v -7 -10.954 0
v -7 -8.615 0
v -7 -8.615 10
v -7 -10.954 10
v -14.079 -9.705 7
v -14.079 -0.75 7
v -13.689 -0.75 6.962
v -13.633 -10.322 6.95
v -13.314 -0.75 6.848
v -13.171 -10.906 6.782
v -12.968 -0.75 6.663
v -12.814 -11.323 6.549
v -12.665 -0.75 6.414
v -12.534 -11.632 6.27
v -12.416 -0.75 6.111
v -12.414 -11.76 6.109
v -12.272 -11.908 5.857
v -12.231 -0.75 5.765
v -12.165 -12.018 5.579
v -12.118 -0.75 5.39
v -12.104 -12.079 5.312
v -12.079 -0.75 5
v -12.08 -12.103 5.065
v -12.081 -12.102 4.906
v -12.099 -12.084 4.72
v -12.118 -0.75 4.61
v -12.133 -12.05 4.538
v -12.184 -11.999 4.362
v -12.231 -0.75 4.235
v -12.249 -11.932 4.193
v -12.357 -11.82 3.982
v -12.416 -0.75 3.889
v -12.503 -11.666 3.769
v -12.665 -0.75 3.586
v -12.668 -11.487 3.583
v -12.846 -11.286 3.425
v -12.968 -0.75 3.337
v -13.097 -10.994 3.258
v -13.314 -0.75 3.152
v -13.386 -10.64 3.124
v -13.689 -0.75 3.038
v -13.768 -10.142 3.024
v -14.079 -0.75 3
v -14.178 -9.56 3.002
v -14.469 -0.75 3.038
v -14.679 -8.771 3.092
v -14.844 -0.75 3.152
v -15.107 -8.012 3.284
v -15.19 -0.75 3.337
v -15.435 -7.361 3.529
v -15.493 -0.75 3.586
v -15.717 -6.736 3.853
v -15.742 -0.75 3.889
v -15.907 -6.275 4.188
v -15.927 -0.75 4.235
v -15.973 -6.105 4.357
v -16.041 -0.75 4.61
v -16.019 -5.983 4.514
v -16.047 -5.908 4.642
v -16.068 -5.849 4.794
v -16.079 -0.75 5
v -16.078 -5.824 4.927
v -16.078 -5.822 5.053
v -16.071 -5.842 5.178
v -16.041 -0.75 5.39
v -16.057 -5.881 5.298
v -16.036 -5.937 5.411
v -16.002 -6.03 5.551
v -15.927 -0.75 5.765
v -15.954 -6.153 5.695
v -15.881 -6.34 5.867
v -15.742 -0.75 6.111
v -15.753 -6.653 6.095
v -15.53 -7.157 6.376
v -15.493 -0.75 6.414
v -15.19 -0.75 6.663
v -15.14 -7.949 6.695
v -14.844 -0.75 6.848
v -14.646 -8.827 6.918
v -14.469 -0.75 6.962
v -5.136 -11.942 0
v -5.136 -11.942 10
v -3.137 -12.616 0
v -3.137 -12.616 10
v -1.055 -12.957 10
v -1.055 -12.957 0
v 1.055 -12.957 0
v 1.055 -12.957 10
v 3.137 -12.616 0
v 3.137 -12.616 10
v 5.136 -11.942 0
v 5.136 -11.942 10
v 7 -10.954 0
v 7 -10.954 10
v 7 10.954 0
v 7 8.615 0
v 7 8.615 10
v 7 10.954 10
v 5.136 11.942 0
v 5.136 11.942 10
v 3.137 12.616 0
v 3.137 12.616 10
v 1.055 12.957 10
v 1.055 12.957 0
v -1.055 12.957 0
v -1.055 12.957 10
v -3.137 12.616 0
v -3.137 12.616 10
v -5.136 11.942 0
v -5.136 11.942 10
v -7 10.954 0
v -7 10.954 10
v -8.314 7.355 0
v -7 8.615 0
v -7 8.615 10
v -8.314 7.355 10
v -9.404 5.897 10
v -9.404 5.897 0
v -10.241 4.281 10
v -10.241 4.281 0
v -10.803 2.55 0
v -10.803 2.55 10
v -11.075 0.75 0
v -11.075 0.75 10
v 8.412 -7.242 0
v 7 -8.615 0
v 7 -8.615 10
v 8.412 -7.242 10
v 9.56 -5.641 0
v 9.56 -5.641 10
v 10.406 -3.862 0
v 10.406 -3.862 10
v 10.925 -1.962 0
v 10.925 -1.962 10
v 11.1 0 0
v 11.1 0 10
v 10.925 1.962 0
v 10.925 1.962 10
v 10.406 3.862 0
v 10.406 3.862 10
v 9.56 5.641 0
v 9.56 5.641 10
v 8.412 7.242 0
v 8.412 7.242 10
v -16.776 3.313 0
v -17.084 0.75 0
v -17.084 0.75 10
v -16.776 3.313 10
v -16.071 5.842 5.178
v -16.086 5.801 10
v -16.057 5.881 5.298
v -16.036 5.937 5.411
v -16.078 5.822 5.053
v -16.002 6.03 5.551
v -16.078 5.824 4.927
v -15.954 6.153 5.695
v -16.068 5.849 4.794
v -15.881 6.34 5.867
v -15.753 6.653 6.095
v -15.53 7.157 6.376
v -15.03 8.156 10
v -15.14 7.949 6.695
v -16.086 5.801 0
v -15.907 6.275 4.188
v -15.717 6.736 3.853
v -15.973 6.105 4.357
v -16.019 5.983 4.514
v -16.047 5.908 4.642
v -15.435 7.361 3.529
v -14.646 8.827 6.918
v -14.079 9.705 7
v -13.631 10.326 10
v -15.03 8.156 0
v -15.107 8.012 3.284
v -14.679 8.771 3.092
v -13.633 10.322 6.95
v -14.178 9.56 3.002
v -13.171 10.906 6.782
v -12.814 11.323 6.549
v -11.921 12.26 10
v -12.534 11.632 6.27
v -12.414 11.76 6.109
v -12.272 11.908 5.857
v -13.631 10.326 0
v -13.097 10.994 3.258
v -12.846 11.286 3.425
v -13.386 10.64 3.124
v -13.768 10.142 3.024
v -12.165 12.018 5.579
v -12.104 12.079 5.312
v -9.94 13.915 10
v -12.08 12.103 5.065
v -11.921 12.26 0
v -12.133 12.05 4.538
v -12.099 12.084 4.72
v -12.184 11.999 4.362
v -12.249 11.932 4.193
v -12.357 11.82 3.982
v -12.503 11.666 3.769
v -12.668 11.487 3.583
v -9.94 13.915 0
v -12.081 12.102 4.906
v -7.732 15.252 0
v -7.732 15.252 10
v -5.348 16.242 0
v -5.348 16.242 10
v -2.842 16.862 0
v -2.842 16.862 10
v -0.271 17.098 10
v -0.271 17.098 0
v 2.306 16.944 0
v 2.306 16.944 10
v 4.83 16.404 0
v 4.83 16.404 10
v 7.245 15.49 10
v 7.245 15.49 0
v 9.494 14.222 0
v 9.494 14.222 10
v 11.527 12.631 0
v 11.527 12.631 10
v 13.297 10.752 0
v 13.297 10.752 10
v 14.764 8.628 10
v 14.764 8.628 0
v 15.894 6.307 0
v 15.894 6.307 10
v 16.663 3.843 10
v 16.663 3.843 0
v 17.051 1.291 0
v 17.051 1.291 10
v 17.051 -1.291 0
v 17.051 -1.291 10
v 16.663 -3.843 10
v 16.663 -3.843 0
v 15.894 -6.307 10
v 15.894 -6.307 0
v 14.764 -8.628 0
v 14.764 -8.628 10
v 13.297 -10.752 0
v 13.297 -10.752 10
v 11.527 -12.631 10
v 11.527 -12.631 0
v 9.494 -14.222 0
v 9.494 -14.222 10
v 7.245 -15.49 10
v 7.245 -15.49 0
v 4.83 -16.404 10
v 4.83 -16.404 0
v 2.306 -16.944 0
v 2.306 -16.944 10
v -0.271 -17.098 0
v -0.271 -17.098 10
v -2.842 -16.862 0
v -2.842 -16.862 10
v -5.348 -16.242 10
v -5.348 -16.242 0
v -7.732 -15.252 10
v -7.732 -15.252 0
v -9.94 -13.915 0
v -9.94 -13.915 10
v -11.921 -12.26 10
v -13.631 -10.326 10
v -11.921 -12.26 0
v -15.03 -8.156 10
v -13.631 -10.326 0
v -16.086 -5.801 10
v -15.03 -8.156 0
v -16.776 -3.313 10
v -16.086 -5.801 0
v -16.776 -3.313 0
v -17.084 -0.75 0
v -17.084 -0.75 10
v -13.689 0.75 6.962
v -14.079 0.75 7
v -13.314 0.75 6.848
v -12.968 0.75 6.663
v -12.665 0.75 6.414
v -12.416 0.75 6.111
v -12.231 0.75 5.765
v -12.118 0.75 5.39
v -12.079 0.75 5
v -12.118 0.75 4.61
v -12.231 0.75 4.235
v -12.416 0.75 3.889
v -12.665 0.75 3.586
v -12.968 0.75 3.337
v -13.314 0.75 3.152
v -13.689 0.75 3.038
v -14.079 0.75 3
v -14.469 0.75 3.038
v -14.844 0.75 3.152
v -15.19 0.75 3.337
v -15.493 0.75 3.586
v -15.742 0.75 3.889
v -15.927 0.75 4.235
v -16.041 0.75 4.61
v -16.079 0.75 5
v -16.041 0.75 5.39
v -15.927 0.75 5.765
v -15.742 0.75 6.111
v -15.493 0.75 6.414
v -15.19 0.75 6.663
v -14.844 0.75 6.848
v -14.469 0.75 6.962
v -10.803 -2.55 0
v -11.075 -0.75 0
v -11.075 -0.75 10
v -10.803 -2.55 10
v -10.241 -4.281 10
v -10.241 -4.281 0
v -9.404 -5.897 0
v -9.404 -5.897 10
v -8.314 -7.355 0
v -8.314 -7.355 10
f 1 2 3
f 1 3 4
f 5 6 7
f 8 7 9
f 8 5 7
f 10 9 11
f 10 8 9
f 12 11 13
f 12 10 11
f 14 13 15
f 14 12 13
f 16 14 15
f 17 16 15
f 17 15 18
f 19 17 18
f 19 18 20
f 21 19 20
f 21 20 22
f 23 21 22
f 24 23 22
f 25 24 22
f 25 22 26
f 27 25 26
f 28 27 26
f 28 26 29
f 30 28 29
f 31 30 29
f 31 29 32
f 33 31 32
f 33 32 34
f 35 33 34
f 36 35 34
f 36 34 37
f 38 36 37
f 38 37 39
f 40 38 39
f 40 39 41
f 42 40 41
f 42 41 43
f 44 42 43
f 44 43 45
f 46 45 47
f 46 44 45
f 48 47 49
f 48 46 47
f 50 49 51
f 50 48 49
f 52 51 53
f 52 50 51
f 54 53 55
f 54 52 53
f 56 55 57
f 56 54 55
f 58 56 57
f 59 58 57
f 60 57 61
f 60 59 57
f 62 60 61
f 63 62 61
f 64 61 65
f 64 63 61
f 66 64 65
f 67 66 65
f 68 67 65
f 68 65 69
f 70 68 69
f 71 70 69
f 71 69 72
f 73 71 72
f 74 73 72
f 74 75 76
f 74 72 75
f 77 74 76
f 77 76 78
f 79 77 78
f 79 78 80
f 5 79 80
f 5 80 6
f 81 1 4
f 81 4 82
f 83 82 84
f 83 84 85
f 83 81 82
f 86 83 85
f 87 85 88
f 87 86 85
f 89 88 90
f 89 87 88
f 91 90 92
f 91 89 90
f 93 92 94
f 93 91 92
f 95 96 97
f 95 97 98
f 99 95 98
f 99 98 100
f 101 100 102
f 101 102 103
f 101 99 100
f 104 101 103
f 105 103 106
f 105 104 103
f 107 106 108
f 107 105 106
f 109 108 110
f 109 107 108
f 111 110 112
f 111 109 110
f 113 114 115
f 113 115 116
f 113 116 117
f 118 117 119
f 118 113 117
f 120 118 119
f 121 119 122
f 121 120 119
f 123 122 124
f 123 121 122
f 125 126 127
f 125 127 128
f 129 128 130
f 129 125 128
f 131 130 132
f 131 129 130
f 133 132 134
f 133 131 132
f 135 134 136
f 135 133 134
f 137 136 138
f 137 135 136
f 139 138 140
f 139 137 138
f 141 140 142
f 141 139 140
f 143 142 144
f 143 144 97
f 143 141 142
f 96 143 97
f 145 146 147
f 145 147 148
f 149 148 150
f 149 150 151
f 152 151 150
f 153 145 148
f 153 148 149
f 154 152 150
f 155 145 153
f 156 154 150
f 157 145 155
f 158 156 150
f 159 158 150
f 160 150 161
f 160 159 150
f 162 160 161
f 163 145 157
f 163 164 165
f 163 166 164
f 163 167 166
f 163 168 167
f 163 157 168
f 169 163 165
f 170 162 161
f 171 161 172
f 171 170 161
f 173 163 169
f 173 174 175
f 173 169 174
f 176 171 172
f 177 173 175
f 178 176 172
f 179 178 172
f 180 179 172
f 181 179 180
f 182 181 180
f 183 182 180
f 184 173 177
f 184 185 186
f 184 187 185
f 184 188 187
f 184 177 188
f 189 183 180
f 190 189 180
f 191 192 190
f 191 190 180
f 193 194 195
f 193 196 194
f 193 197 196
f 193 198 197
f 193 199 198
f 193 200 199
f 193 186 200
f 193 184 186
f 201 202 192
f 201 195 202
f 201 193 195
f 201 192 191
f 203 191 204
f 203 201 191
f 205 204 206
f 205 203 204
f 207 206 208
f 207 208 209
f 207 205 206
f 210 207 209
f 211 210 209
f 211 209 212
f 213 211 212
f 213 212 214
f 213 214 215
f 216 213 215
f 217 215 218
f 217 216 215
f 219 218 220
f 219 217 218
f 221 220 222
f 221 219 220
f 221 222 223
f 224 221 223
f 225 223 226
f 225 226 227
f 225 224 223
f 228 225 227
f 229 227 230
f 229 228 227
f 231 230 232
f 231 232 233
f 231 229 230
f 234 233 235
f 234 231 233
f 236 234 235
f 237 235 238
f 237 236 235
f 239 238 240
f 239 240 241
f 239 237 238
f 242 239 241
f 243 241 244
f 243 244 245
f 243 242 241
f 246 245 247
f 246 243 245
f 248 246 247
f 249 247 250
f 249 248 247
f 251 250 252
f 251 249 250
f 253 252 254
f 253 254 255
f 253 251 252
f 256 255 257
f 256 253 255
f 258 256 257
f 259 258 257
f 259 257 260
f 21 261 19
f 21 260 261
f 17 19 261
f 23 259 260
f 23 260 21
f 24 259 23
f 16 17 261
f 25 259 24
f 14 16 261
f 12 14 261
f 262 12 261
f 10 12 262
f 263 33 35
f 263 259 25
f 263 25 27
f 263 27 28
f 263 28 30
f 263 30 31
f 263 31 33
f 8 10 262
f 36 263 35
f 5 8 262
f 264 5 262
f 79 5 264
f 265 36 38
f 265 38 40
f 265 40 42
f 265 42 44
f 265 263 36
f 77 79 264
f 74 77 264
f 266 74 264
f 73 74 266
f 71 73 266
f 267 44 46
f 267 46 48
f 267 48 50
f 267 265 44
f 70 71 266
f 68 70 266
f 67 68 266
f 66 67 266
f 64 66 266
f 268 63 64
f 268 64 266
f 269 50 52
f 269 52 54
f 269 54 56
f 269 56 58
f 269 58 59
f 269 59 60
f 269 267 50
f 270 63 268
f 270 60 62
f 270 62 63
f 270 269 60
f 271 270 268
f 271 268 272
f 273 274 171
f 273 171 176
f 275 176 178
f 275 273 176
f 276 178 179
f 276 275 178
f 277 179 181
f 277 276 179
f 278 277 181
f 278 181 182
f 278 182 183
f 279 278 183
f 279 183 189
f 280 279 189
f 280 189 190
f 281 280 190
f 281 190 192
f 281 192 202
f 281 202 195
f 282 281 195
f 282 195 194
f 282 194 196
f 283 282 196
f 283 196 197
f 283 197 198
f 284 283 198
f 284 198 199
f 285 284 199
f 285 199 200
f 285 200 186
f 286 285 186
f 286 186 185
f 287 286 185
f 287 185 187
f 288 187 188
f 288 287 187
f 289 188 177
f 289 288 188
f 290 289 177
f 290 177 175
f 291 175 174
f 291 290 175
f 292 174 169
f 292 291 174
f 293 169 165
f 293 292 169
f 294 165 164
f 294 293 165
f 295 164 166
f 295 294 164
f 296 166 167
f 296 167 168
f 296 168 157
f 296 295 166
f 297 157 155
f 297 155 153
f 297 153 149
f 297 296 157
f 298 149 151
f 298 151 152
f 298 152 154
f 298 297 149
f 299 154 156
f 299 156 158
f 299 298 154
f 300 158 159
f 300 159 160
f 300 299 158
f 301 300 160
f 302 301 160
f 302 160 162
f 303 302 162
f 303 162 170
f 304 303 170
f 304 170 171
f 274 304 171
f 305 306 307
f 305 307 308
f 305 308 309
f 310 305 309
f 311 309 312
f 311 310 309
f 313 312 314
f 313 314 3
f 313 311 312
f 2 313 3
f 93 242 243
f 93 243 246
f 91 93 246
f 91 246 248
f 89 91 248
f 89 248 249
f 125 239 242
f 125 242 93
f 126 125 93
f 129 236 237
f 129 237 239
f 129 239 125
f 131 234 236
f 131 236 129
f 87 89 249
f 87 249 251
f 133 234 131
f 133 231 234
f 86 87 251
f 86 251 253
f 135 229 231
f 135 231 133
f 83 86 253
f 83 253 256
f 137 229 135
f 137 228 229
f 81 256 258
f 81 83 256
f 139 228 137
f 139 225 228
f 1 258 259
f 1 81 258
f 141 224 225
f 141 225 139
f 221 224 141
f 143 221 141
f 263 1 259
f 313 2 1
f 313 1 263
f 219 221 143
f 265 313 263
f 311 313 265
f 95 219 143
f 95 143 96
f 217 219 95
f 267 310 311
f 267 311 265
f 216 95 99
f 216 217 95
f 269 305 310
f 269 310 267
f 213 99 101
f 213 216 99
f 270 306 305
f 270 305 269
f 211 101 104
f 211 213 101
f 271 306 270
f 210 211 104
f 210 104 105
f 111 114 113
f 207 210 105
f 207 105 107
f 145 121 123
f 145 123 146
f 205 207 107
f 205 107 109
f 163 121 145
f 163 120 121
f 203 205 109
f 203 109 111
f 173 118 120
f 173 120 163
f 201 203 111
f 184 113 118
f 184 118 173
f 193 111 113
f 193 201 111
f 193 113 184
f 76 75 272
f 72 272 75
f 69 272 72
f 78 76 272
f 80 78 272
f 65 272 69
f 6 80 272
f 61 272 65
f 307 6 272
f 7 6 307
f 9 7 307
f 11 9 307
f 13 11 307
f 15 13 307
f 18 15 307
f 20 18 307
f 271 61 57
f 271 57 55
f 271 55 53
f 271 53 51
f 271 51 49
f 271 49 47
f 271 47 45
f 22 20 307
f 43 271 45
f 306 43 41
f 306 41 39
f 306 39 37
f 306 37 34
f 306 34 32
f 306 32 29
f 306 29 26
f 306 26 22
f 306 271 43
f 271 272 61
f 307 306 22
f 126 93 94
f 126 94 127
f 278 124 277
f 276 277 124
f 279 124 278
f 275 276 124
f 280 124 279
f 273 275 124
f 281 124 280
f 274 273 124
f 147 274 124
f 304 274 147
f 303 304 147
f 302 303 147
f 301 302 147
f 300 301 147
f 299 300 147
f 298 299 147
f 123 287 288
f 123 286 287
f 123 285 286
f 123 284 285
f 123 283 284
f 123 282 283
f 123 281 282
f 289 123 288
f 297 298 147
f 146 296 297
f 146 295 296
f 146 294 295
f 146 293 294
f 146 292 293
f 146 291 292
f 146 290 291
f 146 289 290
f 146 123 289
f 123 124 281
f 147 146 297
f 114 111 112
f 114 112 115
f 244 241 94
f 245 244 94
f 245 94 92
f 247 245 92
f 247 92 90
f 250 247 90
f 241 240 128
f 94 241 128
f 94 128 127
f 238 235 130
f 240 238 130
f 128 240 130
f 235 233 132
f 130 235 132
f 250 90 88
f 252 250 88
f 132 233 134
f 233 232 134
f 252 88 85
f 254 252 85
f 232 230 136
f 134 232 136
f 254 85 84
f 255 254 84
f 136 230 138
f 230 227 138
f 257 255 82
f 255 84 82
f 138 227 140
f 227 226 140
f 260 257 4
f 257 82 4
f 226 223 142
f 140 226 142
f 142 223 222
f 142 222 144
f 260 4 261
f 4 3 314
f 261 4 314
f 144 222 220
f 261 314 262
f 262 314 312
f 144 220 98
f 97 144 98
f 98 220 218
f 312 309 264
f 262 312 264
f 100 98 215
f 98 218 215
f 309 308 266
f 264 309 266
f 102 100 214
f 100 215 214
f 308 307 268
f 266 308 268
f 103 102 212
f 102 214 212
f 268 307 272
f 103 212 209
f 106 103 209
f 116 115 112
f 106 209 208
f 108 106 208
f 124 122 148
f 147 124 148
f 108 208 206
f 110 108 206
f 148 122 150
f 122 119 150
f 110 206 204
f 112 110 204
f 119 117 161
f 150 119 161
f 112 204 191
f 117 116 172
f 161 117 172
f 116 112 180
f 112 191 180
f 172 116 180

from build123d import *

# Parameters (mm, degrees)
BOSS_EXTRUDE1_DEPTH     = 10
CUT_EXTRUDE1_DEPTH      = 27.665192668
CUT_EXTRUDE1_DEPTH_BACK = 27.665192668
SKETCH2_R               = 2


with BuildPart() as part:
    # Sketch1 → Boss-Extrude1 (new body)
    with BuildSketch(Plane.XY):
        with BuildLine():
            Line((-7, 10.95445115), (-7, 8.614522622))
            ThreePointArc((-7, 8.614522622), (-9.855748076, 5.106293163), (-11.074633177, 0.75))
            Line((-11.074633177, 0.75), (-17.083544714, 0.75))
            ThreePointArc((-17.083544714, 0.75), (17.1, 0), (-17.083544714, -0.75))
            Line((-17.083544714, -0.75), (-11.074633177, -0.75))
            ThreePointArc((-11.074633177, -0.75), (-9.855748076, -5.106293163), (-7, -8.614522622))
            Line((-7, -8.614522622), (-7, -10.95445115))
            ThreePointArc((-7, -10.95445115), (0, -13), (7, -10.95445115))
            Line((7, -10.95445115), (7, -8.614522622))
            ThreePointArc((7, -8.614522622), (11.1, 0), (7, 8.614522622))
            Line((7, 8.614522622), (7, 10.95445115))
            ThreePointArc((7, 10.95445115), (0, 13), (-7, 10.95445115))
        make_face()
    extrude(amount=BOSS_EXTRUDE1_DEPTH)

    # Sketch2 → Cut-Extrude1 (cut, two sides: drawn at the far end of the back side and taken through both)
    with BuildSketch(Plane(origin=(0, -0.75, 0), x_dir=(1, 0, 0), z_dir=(0, 1, 0)).offset(-CUT_EXTRUDE1_DEPTH_BACK)):
        with Locations(Location((-14.079088945, -5, 0), (0, 0, 270))):
            Circle(SKETCH2_R)
    extrude(amount=CUT_EXTRUDE1_DEPTH + CUT_EXTRUDE1_DEPTH_BACK, mode=Mode.SUBTRACT)


solid = part.part
